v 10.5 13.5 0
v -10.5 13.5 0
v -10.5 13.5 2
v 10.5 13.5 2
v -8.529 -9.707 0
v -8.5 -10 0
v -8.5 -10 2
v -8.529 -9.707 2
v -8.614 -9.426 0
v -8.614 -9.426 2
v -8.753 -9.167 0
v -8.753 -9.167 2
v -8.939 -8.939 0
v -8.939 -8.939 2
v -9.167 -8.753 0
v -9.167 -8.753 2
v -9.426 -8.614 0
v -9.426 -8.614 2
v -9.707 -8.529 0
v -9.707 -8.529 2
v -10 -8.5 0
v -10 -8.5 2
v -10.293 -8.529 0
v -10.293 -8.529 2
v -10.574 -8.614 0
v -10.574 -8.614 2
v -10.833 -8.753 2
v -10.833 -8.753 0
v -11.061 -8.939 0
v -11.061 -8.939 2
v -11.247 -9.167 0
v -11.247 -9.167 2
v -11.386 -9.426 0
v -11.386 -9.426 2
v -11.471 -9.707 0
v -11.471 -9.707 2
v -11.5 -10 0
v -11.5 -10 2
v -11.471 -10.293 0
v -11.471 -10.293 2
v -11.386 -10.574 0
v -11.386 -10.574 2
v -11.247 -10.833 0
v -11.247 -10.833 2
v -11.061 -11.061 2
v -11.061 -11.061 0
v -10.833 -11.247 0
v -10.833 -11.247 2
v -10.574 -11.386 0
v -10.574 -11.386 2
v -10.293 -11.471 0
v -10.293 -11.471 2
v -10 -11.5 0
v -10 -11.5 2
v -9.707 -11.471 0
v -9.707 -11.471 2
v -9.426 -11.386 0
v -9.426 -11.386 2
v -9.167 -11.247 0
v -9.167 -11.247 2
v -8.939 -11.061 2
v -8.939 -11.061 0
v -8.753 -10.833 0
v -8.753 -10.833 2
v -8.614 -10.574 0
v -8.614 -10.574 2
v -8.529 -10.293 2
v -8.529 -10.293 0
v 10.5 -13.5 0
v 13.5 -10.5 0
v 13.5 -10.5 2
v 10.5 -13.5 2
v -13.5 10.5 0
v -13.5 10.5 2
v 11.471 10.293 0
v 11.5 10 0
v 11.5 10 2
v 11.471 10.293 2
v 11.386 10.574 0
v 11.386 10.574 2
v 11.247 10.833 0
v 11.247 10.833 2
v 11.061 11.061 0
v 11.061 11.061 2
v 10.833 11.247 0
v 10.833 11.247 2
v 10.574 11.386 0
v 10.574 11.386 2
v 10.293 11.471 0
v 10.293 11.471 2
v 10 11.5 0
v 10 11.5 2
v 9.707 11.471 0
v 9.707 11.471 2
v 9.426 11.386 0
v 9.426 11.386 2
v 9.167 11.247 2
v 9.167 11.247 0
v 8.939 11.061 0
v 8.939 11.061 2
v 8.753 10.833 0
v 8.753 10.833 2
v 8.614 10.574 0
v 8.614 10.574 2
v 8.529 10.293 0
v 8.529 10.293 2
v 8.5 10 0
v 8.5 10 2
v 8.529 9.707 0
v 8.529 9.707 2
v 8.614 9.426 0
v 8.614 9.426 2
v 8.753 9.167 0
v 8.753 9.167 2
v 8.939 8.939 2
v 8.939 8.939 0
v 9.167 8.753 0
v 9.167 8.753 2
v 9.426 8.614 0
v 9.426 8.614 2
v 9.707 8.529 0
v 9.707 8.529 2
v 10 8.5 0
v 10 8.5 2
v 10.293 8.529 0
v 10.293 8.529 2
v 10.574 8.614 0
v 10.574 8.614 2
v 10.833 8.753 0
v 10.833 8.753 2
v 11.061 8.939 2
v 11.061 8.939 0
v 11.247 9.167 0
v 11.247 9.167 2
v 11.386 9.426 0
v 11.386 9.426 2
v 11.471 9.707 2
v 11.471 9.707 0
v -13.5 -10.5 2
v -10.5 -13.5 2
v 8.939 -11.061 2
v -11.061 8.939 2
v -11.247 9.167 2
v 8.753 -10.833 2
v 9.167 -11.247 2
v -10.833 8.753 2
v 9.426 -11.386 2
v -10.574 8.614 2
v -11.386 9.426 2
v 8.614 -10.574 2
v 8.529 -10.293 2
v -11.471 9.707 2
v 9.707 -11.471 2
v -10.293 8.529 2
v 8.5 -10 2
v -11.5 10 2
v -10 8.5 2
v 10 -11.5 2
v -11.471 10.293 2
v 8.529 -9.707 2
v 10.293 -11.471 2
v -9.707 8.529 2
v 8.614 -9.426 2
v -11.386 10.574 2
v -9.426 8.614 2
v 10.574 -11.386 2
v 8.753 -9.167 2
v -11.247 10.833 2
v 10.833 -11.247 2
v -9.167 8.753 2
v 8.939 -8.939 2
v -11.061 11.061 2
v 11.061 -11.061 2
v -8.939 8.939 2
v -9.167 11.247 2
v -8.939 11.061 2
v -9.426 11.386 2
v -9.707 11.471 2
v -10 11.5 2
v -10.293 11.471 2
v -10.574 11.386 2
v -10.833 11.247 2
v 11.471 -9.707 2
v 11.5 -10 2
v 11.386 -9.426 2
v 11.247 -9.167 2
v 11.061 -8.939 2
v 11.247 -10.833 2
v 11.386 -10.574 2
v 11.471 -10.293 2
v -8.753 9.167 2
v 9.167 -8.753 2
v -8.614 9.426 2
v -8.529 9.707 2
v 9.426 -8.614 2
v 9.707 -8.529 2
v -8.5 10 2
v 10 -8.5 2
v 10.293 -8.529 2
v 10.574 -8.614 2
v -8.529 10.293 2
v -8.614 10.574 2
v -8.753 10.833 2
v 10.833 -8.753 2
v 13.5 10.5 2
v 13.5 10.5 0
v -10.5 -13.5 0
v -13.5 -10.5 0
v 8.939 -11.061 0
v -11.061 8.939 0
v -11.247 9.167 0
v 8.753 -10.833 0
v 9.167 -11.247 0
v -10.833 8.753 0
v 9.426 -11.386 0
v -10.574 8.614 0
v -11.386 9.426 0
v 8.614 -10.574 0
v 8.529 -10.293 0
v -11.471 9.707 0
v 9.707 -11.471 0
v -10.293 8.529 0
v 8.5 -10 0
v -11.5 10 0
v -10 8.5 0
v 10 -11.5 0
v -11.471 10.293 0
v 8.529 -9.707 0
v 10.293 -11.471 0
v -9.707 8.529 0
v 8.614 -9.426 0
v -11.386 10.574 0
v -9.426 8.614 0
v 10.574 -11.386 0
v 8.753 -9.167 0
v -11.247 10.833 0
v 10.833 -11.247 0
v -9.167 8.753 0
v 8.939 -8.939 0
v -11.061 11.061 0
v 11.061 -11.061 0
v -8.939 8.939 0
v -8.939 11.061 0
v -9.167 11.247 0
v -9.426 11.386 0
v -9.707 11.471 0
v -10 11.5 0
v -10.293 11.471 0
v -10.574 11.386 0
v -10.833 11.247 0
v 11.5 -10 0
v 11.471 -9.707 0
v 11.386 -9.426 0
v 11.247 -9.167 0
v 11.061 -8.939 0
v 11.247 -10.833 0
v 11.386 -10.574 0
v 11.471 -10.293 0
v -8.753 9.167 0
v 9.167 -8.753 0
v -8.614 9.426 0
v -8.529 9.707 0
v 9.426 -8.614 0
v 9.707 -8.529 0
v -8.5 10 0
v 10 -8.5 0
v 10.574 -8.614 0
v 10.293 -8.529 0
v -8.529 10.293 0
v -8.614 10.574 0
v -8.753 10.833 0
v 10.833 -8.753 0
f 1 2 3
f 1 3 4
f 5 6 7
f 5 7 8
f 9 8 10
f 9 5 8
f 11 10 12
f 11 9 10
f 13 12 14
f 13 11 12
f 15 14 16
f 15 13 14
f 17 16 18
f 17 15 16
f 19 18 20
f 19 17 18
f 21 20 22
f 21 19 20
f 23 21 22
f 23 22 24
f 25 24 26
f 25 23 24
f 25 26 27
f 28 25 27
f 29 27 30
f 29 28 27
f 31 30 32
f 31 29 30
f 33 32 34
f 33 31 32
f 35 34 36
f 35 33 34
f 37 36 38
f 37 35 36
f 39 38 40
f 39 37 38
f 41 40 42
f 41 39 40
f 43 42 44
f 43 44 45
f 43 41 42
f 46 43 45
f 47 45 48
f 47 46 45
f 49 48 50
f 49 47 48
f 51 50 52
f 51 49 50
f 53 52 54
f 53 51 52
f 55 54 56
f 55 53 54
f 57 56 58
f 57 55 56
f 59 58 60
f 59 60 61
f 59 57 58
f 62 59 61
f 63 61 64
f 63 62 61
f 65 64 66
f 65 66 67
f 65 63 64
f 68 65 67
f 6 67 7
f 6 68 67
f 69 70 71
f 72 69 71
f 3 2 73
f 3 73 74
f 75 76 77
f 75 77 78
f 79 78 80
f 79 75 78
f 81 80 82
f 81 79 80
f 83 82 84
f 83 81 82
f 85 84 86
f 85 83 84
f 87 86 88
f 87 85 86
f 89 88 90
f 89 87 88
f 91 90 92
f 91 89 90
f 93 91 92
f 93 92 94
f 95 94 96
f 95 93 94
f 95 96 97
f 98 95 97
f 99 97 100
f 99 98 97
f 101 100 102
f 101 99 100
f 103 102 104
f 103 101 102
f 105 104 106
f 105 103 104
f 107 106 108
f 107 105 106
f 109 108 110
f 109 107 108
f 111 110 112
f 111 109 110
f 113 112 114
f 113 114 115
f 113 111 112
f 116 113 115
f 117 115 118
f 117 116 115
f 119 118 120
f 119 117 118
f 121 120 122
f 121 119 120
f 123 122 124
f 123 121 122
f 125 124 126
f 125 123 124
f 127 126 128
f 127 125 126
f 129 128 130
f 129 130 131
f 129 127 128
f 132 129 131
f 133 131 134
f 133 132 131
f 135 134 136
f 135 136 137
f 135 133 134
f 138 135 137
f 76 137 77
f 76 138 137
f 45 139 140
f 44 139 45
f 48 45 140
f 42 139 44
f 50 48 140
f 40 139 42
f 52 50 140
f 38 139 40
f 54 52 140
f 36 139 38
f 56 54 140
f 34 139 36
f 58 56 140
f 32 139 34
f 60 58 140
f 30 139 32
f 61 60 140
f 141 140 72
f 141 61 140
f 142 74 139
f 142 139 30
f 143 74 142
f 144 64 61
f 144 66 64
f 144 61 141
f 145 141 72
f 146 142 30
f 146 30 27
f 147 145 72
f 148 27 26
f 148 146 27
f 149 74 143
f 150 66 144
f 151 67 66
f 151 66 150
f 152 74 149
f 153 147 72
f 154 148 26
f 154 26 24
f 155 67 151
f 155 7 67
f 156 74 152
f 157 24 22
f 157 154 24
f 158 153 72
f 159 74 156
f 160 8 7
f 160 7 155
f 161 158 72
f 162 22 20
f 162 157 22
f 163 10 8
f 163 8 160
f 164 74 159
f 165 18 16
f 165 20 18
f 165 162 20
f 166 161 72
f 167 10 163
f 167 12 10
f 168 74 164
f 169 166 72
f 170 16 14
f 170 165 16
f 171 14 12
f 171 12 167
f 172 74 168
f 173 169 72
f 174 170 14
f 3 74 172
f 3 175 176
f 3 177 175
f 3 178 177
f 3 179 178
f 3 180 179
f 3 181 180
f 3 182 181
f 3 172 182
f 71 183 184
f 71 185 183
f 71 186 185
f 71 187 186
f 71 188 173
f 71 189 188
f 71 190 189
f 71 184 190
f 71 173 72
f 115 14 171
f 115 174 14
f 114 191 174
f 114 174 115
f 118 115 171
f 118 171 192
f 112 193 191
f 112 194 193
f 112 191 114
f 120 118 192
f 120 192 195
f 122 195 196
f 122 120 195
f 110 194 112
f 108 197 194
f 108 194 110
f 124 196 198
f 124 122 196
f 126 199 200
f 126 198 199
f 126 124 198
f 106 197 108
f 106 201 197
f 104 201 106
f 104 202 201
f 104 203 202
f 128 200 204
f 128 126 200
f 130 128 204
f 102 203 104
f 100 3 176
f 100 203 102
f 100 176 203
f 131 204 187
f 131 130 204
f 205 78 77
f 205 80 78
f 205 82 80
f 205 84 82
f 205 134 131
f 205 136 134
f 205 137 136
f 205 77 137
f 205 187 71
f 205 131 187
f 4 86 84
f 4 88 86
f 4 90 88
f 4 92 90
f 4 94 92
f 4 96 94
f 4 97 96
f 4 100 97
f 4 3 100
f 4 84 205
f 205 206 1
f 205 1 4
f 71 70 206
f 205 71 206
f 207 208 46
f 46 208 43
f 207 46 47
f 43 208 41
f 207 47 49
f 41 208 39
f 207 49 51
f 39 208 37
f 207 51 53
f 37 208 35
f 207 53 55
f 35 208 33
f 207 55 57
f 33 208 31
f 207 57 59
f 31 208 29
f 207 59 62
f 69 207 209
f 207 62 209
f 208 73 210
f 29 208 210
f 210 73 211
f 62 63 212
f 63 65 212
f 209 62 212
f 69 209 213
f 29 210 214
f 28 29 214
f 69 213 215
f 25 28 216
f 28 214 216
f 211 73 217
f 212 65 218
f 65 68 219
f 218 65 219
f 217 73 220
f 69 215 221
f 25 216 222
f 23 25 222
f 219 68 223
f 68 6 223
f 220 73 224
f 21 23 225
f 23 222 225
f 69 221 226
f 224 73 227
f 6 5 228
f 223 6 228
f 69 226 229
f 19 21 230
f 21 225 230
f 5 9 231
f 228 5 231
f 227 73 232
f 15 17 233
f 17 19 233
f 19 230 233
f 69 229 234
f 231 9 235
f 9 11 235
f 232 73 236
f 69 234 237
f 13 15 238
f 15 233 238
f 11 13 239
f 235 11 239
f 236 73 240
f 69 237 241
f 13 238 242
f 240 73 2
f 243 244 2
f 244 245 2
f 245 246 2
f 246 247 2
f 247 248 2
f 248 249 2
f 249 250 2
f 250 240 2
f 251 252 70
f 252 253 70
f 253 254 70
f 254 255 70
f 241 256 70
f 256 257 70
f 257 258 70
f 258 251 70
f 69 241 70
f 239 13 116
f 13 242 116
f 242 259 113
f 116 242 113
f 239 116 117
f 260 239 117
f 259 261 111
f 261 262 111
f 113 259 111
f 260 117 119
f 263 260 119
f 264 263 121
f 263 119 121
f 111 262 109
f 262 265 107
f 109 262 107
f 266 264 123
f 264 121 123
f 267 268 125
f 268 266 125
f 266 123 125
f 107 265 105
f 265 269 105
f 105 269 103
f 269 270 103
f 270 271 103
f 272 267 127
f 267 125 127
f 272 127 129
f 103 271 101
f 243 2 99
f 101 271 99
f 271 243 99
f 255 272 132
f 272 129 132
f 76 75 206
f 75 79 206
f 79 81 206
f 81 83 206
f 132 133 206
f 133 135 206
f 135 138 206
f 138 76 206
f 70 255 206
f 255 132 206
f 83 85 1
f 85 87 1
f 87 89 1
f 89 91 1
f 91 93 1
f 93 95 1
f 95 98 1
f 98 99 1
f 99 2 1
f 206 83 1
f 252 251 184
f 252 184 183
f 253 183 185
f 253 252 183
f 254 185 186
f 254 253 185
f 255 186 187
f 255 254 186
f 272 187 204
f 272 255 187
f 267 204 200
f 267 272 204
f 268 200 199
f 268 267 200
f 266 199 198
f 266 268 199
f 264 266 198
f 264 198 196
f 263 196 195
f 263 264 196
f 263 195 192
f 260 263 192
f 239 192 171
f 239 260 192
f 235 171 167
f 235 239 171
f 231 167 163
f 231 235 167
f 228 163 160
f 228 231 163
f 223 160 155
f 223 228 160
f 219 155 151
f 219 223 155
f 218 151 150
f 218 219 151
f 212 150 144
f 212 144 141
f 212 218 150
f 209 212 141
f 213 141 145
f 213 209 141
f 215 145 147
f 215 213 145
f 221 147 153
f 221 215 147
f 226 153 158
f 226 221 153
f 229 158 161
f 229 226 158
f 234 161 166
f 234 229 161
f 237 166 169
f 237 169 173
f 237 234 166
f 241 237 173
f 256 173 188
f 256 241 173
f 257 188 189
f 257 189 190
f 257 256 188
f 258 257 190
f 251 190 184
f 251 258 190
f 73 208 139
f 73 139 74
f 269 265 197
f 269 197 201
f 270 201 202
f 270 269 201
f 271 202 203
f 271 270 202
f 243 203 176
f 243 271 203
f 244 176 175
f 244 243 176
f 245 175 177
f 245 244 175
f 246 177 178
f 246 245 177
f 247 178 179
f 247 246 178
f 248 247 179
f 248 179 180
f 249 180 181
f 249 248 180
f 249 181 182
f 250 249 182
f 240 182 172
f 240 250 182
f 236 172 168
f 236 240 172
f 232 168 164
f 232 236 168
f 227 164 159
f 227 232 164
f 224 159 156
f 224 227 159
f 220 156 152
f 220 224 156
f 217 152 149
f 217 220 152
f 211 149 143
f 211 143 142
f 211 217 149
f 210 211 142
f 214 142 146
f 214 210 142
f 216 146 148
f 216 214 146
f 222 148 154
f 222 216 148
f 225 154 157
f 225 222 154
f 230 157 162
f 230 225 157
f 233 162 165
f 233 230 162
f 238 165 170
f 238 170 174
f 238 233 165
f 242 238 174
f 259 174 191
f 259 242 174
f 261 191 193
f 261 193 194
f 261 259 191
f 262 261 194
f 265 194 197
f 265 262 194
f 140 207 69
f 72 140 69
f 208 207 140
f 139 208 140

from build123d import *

# Parameters (mm, degrees)
F0_W     = 27
F0_H     = 27
F0_R     = 1.5
F1_DEPTH = 2
F2_SIZE  = 3


with BuildPart() as f1:
    # F0 (on Top) → F1 (new body)
    with BuildSketch(Plane.XY):
        Rectangle(F0_W, F0_H)
        with Locations((-10, -10)):
            Circle(F0_R, mode=Mode.SUBTRACT)
        with Locations((10, -10)):
            Circle(F0_R, mode=Mode.SUBTRACT)
        with Locations((-10, 10)):
            Circle(F0_R, mode=Mode.SUBTRACT)
        with Locations((10, 10)):
            Circle(F0_R, mode=Mode.SUBTRACT)
    extrude(amount=F1_DEPTH)

    # F2
    f2_edges = [f1.edges().sort_by_distance(p)[0] for p in [
        (13.5, -13.5, 1),
        (-13.5, -13.5, 1),
        (13.5, 13.5, 1),
        (-13.5, 13.5, 1),
    ]]
    chamfer(f2_edges, length=F2_SIZE)


solid = f1.part
